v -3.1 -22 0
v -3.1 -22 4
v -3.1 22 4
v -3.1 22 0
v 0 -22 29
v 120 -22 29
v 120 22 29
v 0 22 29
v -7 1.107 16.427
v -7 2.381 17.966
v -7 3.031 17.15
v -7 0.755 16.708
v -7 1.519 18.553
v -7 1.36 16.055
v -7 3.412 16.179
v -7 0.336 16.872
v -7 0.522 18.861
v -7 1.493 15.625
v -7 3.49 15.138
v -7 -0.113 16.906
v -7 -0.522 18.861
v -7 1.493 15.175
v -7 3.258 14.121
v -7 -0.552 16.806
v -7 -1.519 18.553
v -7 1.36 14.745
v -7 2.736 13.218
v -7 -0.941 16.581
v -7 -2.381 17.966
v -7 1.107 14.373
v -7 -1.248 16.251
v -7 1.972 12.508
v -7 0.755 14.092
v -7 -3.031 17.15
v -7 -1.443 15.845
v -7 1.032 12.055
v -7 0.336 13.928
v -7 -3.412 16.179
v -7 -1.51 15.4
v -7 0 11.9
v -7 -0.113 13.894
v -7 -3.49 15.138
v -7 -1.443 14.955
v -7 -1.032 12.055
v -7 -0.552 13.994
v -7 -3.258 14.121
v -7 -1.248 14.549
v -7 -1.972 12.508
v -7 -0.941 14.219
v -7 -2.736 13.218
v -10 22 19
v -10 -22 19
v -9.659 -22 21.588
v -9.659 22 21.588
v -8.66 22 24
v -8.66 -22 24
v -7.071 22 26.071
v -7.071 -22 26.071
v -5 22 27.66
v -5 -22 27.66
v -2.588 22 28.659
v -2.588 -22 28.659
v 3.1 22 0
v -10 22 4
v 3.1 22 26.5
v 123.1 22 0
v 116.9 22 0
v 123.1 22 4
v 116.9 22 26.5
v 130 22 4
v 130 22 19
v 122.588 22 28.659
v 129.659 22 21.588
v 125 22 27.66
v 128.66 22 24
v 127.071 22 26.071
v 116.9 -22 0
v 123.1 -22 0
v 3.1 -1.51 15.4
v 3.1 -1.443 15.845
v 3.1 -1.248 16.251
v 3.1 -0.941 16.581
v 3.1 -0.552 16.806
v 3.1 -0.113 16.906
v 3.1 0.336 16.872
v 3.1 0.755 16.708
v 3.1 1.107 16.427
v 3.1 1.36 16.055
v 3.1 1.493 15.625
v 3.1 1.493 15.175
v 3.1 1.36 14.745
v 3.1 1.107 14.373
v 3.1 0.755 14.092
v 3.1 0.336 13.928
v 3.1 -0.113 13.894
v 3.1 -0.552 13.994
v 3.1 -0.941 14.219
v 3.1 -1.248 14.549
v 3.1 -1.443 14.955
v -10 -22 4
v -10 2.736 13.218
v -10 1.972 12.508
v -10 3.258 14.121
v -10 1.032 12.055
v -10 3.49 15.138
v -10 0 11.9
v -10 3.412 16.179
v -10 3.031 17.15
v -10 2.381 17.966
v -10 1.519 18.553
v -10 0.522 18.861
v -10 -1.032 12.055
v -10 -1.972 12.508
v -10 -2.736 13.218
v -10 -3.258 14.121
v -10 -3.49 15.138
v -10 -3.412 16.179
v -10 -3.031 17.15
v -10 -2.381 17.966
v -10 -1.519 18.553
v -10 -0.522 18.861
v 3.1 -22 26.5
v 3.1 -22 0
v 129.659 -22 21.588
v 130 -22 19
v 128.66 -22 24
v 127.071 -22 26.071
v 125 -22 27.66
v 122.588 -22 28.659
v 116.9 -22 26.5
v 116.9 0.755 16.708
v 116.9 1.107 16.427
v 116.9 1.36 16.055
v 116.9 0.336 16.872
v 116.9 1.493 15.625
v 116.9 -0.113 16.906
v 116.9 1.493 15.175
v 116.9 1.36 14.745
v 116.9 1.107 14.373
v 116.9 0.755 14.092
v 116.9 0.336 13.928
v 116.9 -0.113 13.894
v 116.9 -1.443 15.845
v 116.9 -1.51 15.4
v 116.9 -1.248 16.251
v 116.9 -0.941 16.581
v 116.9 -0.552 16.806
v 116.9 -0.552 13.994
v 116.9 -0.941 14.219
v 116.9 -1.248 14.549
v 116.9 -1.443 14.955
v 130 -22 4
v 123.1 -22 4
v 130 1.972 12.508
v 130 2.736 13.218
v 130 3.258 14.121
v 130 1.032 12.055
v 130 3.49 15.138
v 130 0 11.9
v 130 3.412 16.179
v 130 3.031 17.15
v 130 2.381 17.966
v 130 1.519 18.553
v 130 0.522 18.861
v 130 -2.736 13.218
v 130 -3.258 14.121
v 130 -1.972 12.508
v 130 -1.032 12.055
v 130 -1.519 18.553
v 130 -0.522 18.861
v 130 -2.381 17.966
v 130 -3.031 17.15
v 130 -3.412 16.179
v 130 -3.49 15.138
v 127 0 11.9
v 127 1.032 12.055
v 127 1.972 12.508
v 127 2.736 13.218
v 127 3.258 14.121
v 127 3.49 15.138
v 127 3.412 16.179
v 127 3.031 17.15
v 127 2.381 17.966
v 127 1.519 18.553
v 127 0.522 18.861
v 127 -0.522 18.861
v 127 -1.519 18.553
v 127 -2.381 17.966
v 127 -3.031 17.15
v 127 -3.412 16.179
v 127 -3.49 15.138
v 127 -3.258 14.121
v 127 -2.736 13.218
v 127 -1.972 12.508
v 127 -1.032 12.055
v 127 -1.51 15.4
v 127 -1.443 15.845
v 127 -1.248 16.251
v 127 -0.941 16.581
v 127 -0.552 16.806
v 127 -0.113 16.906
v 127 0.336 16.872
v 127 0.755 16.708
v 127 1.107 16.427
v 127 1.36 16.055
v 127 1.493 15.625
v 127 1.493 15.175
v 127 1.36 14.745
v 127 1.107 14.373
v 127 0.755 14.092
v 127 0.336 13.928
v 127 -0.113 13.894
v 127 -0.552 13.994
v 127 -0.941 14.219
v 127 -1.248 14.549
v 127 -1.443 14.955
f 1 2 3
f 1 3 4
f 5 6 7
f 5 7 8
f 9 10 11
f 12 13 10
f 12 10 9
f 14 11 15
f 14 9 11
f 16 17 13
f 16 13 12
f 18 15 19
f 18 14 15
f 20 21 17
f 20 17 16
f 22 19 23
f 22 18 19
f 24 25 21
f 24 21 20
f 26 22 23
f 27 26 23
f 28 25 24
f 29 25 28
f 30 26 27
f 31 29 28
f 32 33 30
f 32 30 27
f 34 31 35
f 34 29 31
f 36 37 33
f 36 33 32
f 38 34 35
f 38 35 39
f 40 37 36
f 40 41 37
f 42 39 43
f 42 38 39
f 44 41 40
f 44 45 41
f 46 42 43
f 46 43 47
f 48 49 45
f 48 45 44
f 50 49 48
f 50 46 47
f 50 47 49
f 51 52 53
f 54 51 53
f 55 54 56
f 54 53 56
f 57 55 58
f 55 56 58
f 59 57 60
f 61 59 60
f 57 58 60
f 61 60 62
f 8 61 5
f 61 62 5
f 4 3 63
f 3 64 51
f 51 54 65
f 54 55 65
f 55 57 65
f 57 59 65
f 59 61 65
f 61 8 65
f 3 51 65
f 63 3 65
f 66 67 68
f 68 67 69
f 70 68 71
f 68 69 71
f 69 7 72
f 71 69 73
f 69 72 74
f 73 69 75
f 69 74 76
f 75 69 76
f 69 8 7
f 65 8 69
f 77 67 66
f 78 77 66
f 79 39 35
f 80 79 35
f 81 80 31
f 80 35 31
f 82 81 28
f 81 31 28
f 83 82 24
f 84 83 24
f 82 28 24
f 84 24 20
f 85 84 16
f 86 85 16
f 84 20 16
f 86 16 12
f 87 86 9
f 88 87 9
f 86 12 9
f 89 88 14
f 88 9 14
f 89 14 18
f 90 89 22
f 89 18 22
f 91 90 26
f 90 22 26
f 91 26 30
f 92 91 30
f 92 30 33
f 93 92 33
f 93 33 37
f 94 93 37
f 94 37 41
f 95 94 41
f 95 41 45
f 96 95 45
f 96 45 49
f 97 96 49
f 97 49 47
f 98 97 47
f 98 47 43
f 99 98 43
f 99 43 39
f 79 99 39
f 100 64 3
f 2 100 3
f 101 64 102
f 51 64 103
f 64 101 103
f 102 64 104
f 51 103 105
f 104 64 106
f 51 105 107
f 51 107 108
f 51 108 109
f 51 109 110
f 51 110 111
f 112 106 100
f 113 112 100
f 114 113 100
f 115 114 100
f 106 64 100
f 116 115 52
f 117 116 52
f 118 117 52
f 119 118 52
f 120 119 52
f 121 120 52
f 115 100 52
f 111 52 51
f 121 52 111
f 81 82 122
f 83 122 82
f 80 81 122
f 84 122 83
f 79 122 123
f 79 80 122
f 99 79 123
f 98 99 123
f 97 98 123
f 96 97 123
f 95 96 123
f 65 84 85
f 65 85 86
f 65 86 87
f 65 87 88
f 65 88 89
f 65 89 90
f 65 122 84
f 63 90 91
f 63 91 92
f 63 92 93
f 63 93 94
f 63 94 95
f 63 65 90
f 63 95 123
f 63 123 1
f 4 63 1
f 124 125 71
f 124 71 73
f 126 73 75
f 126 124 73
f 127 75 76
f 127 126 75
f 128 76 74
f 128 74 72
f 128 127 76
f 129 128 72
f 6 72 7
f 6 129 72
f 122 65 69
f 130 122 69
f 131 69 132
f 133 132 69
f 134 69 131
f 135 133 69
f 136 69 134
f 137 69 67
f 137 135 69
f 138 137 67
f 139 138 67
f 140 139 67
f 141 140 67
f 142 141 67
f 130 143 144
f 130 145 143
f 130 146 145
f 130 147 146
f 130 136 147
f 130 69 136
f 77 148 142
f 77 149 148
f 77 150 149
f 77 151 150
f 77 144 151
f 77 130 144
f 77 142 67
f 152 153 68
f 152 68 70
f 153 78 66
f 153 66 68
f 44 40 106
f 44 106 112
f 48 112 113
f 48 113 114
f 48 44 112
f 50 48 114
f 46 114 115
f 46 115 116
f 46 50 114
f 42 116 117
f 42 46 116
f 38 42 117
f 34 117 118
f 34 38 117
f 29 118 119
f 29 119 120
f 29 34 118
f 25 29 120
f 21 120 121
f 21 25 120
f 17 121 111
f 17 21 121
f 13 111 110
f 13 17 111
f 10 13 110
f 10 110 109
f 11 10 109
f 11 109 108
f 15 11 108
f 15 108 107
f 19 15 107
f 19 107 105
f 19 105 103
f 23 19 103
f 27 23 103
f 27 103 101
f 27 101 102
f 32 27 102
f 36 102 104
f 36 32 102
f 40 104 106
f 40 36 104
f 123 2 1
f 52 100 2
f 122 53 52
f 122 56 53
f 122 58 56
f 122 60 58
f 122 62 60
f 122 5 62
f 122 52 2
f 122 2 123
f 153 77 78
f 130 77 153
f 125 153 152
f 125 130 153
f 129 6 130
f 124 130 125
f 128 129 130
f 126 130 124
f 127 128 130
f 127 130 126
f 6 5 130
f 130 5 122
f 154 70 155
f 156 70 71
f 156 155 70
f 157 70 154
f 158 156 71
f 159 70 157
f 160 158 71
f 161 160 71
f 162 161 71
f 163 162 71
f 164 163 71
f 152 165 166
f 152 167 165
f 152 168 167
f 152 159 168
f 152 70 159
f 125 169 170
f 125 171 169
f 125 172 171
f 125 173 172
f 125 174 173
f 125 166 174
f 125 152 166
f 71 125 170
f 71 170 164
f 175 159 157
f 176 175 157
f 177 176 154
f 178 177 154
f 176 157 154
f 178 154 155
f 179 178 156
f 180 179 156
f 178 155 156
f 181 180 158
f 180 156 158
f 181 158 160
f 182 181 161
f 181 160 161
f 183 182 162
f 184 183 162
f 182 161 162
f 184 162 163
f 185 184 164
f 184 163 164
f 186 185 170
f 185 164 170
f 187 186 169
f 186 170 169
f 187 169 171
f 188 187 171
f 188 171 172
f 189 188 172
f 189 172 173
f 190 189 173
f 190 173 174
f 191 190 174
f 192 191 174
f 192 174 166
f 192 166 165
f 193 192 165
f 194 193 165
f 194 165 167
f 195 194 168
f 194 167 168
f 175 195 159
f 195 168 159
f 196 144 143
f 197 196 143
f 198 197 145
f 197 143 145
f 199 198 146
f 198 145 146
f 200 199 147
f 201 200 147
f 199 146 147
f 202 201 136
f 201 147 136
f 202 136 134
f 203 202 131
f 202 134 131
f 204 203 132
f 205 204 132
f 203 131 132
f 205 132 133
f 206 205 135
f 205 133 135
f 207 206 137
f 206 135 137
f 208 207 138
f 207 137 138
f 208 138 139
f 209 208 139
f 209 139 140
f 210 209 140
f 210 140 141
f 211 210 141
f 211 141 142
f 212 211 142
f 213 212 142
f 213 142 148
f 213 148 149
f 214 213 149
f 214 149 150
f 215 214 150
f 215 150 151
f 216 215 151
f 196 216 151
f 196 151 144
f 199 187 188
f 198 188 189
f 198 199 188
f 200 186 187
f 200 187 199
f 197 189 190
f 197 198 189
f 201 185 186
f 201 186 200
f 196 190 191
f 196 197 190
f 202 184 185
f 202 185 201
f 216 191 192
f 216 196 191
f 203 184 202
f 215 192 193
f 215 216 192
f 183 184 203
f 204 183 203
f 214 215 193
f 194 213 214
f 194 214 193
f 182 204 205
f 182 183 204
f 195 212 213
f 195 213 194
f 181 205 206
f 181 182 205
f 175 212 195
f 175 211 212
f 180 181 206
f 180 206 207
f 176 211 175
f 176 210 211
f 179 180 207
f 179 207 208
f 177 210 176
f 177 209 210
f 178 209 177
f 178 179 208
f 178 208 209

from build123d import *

# Parameters (mm, degrees)
EXTRUDE_1_DEPTH      = 14
CUT_EXTRUDE_1_DEPTH  = 44
SKETCH_3_W           = 6.2
SKETCH_3_H           = 6.2
CUT_EXTRUDE_2_DEPTH  = 4
SKETCH_4_R           = 4
CUT_EXTRUDE_3_DEPTH  = 5
SKETCH_5_R           = 2.6
CUT_EXTRUDE_4_DEPTH  = 5
SKETCH_6_R           = 4
EXTRUDE_2_DEPTH      = 10
SKETCH_7_W           = 6.2
SKETCH_7_H           = 4
EXTRUDE_3_DEPTH      = 40
CUT_EXTRUDE_5_DEPTH  = 50
SKETCH_9_W           = 20
SKETCH_9_H           = 25
EXTRUDE_4_DEPTH      = 44
CUT_EXTRUDE_6_DEPTH  = 44
EXTRUDE_5_DEPTH      = 44
SKETCH_12_W          = 6.9
SKETCH_12_H          = 22.5
CUT_EXTRUDE_7_DEPTH  = 50
SKETCH_13_R          = 3.5
CUT_EXTRUDE_9_DEPTH  = 3
CUT_EXTRUDE_START    = -3
SKETCH_14_R          = 3.5
CUT_EXTRUDE_10_DEPTH = 3
SKETCH_15_R          = 1.51
CUT_EXTRUDE_11_DEPTH = 200


with BuildPart() as part:
    # 草图1 → 凸台-拉伸1 (new body)
    with BuildSketch(Plane.XY):
        Polygon((-15, 22), (-15, -22), (15, -22), (15, 22), (0, 22), align=None)
    extrude(amount=EXTRUDE_1_DEPTH)

    # 草图2 → 切除-拉伸1 (cut)
    with BuildSketch(Plane(origin=(0, 22, 0), x_dir=(1, 0, 0), z_dir=(0, 1, 0))):
        Polygon((-15, 0), (-15, -14), (-10, -4), (-3.1, -4), (-3.1, 0), align=None)
        Polygon((3.1, -4), (10, -4), (15, -14), (15, 0), (3.1, 0), align=None)
    extrude(amount=-CUT_EXTRUDE_1_DEPTH, mode=Mode.SUBTRACT)

    # 草图3 → 切除-拉伸2 (cut)
    with BuildSketch(Plane(origin=(0, 0, 0), x_dir=(-1, 0, 0), z_dir=(0, 0, -1))):
        Rectangle(SKETCH_3_W, SKETCH_3_H)
    extrude(amount=-CUT_EXTRUDE_2_DEPTH, mode=Mode.SUBTRACT)

    # 草图4 → 切除-拉伸3 (cut)
    with BuildSketch(Plane.XY.offset(14)):
        Circle(SKETCH_4_R)
    extrude(amount=-CUT_EXTRUDE_3_DEPTH, mode=Mode.SUBTRACT)

    # 草图5 → 切除-拉伸4 (cut)
    with BuildSketch(Plane.XY.offset(9)):
        Circle(SKETCH_5_R)
    extrude(amount=-CUT_EXTRUDE_4_DEPTH, mode=Mode.SUBTRACT)

    # 草图6 → 凸台-拉伸2 (add)
    with BuildSketch(Plane.XY.offset(14)):
        Circle(SKETCH_6_R)
    extrude(amount=-EXTRUDE_2_DEPTH)

    # 草图7 → 凸台-拉伸3 (add)
    with BuildSketch(Plane(origin=(0, -22, 0), x_dir=(-1, 0, 0), z_dir=(0, -1, 0))):
        with Locations((0, -2)):
            Rectangle(SKETCH_7_W, SKETCH_7_H)
    extrude(amount=-EXTRUDE_3_DEPTH)

    # 草图8 → 切除-拉伸5 (cut)
    with BuildSketch(Plane.XZ.offset(22)):
        Polygon((-15, 14), (-10, 4), (-10, 14), align=None)
        Polygon((15, 14), (10, 14), (10, 4), align=None)
    extrude(amount=-CUT_EXTRUDE_5_DEPTH, mode=Mode.SUBTRACT)

    # 草图9 → 凸台-拉伸4 (add)
    with BuildSketch(Plane.XZ.offset(22)):
        with Locations((0, 16.5)):
            Rectangle(SKETCH_9_W, SKETCH_9_H)
    extrude(amount=-EXTRUDE_4_DEPTH)

    # 草图10 → 切除-拉伸6 (cut)
    with BuildSketch(Plane.XZ.offset(22)):
        with BuildLine():
            Line((-10, 29), (-10, 19))
            ThreePointArc((-10, 19), (-7.071067812, 26.071067812), (0, 29))
            Line((0, 29), (-10, 29))
        make_face()
    extrude(amount=-CUT_EXTRUDE_6_DEPTH, mode=Mode.SUBTRACT)

    # 草图11 → 凸台-拉伸5 (add)
    with BuildSketch(Plane.XZ.offset(22)):
        with BuildLine():
            Line((120, 0), (123.1, 0))
            Line((123.1, 0), (123.1, 4))
            Line((123.1, 4), (130, 4))
            Line((130, 4), (130, 19))
            ThreePointArc((130, 19), (127.071067812, 26.071067812), (120, 29))
            Line((120, 29), (110, 29))
            Line((110, 29), (10, 29))
            Line((10, 29), (10, 26.5))
            Line((10, 26.5), (110, 26.5))
            Line((110, 26.5), (110, 4))
            Line((110, 4), (116.9, 4))
            Line((116.9, 4), (116.9, 0))
            Line((116.9, 0), (120, 0))
        make_face()
    extrude(amount=-EXTRUDE_5_DEPTH)

    # 草图12 → 切除-拉伸7 (cut)
    with BuildSketch(Plane(origin=(0, 22, 0), x_dir=(1, 0, 0), z_dir=(0, 1, 0))):
        with Locations((6.55, -15.25)):
            Rectangle(SKETCH_12_W, SKETCH_12_H)
        with Locations((113.45, -15.25)):
            Rectangle(SKETCH_12_W, SKETCH_12_H)
    extrude(amount=-CUT_EXTRUDE_7_DEPTH, mode=Mode.SUBTRACT)

    # 草图13 → 切除-拉伸9 (cut)
    with BuildSketch(Plane(origin=(130, 0, 0), x_dir=(0, 0, -1), z_dir=(1, 0, 0))):
        with Locations((-15.4, 0)):
            Circle(SKETCH_13_R)
    extrude(amount=-CUT_EXTRUDE_9_DEPTH, mode=Mode.SUBTRACT)

    # 草图14 → 切除-拉伸10 (cut)
    with BuildSketch(Plane.ZY.offset(10).offset(CUT_EXTRUDE_START)):
        with Locations(Location((15.4, 0, 0), (0, 0, 180))):
            Circle(SKETCH_14_R)
    extrude(amount=CUT_EXTRUDE_10_DEPTH, mode=Mode.SUBTRACT)

    # 草图15 → 切除-拉伸11 (cut)
    with BuildSketch(Plane.ZY.offset(7)):
        with Locations(Location((15.4, 0, 0), (0, 0, 270))):
            Circle(SKETCH_15_R)
    extrude(amount=-CUT_EXTRUDE_11_DEPTH, mode=Mode.SUBTRACT)


solid = part.part
